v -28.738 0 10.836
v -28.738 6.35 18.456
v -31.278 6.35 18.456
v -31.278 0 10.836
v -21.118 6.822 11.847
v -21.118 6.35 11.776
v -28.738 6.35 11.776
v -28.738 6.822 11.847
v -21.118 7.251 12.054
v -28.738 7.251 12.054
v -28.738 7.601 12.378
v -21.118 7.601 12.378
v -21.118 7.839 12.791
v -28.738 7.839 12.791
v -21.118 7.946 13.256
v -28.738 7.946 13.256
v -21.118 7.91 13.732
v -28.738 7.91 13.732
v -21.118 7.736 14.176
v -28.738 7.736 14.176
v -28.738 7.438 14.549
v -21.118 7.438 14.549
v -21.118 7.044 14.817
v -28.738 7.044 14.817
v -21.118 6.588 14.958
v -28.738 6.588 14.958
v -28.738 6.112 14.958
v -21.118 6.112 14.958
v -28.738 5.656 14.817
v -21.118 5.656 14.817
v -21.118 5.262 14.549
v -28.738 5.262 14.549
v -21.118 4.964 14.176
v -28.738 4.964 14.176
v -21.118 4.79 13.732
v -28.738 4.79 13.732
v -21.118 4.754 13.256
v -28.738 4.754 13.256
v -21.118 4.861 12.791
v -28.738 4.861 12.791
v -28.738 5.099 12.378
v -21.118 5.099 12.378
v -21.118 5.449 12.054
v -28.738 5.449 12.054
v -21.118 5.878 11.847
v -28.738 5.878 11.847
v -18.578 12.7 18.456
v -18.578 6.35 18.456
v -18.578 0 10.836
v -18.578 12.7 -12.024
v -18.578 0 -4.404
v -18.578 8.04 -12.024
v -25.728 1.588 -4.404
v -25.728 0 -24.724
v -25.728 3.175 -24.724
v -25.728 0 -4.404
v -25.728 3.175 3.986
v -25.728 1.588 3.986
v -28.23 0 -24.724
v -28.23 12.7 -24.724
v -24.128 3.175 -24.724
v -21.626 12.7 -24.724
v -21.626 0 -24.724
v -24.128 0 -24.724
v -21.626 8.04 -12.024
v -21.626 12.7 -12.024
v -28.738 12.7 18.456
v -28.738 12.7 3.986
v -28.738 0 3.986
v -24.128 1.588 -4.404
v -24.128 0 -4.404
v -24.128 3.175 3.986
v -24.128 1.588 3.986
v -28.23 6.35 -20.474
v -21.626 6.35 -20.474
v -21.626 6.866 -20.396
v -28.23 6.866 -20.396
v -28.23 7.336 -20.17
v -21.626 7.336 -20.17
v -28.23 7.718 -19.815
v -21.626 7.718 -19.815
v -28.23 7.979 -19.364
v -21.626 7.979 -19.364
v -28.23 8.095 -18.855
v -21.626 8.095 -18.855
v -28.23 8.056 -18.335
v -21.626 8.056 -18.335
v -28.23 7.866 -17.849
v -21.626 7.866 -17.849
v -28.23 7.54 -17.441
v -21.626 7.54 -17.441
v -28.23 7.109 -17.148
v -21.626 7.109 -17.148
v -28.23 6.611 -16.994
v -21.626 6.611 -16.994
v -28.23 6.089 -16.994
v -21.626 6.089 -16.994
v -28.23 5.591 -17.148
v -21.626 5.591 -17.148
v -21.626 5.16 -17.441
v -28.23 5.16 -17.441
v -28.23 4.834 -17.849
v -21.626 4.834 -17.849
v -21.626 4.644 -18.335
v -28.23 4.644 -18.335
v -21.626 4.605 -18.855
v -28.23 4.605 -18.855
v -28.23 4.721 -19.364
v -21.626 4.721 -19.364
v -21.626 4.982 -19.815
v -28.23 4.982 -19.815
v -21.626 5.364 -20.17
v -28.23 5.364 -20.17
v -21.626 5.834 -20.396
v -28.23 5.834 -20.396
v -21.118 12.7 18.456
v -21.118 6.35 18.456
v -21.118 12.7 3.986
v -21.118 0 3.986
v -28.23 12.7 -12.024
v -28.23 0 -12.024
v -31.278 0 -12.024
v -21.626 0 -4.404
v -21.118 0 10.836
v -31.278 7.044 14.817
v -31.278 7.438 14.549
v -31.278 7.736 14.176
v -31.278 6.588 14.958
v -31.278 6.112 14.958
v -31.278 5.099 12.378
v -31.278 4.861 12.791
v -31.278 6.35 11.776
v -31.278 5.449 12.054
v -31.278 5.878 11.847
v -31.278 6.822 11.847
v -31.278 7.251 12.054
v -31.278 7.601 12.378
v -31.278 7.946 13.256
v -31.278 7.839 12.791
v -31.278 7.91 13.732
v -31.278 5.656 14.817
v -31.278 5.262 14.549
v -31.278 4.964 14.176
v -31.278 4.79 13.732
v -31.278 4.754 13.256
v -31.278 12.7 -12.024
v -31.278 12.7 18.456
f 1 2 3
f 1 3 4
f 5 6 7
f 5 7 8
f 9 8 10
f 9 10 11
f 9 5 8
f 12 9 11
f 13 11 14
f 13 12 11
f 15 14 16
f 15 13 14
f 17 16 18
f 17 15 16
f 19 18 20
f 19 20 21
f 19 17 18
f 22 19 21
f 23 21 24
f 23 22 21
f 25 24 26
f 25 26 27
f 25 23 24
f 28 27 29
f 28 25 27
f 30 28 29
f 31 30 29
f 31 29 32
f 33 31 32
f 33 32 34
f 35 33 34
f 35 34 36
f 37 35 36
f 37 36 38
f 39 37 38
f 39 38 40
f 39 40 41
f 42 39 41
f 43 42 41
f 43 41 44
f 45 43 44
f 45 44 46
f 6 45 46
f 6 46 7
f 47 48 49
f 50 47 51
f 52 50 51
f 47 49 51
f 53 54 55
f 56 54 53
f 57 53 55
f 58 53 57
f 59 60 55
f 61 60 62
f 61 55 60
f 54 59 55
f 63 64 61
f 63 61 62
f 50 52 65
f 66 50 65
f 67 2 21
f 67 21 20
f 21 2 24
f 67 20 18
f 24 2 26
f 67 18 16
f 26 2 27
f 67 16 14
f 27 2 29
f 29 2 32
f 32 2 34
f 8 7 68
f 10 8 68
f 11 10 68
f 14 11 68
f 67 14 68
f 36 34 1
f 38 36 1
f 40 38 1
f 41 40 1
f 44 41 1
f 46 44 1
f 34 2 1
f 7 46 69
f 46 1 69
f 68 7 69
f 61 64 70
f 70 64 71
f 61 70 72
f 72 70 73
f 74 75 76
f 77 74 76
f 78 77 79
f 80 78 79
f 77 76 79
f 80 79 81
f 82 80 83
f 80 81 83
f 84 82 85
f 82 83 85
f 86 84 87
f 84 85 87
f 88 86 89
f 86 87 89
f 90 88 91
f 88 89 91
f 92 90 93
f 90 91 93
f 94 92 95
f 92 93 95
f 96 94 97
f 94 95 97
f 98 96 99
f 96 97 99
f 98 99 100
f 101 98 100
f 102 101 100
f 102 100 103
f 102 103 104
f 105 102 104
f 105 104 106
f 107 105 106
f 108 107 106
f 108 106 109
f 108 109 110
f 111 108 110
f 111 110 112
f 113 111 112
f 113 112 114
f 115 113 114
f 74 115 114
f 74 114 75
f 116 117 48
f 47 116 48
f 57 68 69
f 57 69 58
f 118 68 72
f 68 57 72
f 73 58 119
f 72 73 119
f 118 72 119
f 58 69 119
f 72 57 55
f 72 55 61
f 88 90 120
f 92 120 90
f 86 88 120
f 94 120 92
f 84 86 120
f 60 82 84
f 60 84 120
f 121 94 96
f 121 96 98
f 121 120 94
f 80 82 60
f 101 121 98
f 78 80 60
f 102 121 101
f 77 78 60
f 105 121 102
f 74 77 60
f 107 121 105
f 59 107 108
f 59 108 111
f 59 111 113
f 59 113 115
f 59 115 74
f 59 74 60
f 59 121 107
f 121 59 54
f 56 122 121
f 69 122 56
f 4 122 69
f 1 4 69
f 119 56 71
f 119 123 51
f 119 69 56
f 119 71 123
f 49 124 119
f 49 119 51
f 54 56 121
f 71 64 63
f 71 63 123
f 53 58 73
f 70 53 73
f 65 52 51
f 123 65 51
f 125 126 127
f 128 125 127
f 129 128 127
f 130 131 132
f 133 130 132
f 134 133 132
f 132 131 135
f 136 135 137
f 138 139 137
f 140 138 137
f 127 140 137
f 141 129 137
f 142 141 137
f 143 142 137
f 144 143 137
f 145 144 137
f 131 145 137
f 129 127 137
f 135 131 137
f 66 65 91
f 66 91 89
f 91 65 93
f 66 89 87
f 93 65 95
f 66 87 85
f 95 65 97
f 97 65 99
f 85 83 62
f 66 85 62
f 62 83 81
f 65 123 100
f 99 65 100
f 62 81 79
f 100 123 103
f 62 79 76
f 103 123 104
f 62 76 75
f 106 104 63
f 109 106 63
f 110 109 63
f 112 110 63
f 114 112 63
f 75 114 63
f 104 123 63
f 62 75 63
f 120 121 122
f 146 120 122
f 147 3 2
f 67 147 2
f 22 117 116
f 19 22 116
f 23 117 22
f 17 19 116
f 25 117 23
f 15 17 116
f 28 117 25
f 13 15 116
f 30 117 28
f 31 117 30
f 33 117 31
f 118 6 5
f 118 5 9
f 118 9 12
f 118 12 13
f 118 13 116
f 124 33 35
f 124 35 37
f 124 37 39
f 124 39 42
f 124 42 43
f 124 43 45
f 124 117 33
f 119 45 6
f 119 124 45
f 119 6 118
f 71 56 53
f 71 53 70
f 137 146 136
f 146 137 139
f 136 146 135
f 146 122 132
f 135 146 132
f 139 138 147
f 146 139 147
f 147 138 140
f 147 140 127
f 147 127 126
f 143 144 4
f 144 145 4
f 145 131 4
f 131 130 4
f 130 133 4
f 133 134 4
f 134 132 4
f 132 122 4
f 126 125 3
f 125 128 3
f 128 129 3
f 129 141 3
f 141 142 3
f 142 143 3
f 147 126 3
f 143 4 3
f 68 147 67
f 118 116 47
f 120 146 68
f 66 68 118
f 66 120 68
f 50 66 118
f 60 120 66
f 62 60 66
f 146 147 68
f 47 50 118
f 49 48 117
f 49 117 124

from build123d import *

# Parameters (mm, degrees)
SKETCH2_W           = 6.604
SKETCH2_H           = 12.7
SKETCH2_W_2         = 2.54
SKETCH2_H_2         = 14.47
BOSS_EXTRUDE1_DEPTH = 12.7
SKETCH3_R           = 1.75
CUT_EXTRUDE1_DEPTH  = 32.27817965
BOSS_EXTRUDE4_START = -18.57818
SKETCH3_3_R         = 1.6
BOSS_EXTRUDE4_DEPTH = 12.7
CUT_EXTRUDE12_DEPTH = 13.70000035
CUT_EXTRUDE14_DEPTH = 3.048
SKETCH37_W          = 1.6
SKETCH37_H          = 28.71
CUT_EXTRUDE17_DEPTH = 3.175
SKETCH38_W          = 1.677757264
SKETCH38_H          = 8.39
BOSS_EXTRUDE7_DEPTH = 1.5875


with BuildPart() as part:
    # Sketch2 → Boss-Extrude1 (new body)
    with BuildSketch(Plane(origin=(0, 0, 0), x_dir=(1, 0, 0), z_dir=(0, 1, 0))):
        Polygon((-28.23017965, 12.02419618), (-31.27817965, 12.02419618), (-31.27817965, -3.98580382), (-28.73817965, -3.98580382), (-21.11817965, -3.98580382), (-18.57817965, -3.98580382), (-18.57817965, 12.02419618), (-21.62617965, 12.02419618), align=None)
        with Locations((-24.92817965, 18.37419618)):
            Rectangle(SKETCH2_W, SKETCH2_H)
        with Locations((-19.84817965, -11.22080382)):
            Rectangle(SKETCH2_W_2, SKETCH2_H_2)
        with Locations((-30.00817965, -11.22080382)):
            Rectangle(SKETCH2_W_2, SKETCH2_H_2)
    extrude(amount=BOSS_EXTRUDE1_DEPTH)

    # Sketch3 → Cut-Extrude1 (cut, through all)
    with BuildSketch(Plane(origin=(0, 0, 0), x_dir=(0, 0, -1), z_dir=(1, 0, 0))):
        with Locations((18.72419618, 6.35)):
            Circle(SKETCH3_R)
    extrude(amount=-CUT_EXTRUDE1_DEPTH, mode=Mode.SUBTRACT)

    # Sketch3<3> → Boss-Extrude4 (add, through all)
    with BuildSketch(Plane(origin=(0, 0, 0), x_dir=(0, 0, -1), z_dir=(1, 0, 0)).offset(BOSS_EXTRUDE4_START)):
        with Locations((-13.37580382, 6.35)):
            Circle(SKETCH3_3_R)
    extrude(amount=-BOSS_EXTRUDE4_DEPTH)

    # Sketch29 → Cut-Extrude12 (cut, through all)
    with BuildSketch(Plane(origin=(-18.57817965, 0, 0), x_dir=(0, 0, -1), z_dir=(1, 0, 0))):
        Polygon((-18.45580382, 6.35), (-10.83580382, 0), (-18.45580382, 0), align=None)
    extrude(amount=-CUT_EXTRUDE12_DEPTH, mode=Mode.SUBTRACT)

    # Sketch31 → Cut-Extrude14 (cut)
    with BuildSketch(Plane(origin=(-18.57817965, 0, 0), x_dir=(0, 0, -1), z_dir=(1, 0, 0))):
        Polygon((12.02419618, 8.039800124), (4.40419618, 0), (12.02419618, 0), align=None)
    extrude(amount=-CUT_EXTRUDE14_DEPTH, mode=Mode.SUBTRACT)

    # Sketch37 → Cut-Extrude17 (cut)
    with BuildSketch(Plane.XZ):
        with Locations((-24.92817965, -10.36919618)):
            Rectangle(SKETCH37_W, SKETCH37_H)
    extrude(amount=-CUT_EXTRUDE17_DEPTH, mode=Mode.SUBTRACT)

    # Sketch38 → Boss-Extrude7 (add)
    with BuildSketch(Plane.XZ):
        with Locations((-24.889301018, -0.20919618)):
            Rectangle(SKETCH38_W, SKETCH38_H)
    extrude(amount=-BOSS_EXTRUDE7_DEPTH)


solid = part.part
